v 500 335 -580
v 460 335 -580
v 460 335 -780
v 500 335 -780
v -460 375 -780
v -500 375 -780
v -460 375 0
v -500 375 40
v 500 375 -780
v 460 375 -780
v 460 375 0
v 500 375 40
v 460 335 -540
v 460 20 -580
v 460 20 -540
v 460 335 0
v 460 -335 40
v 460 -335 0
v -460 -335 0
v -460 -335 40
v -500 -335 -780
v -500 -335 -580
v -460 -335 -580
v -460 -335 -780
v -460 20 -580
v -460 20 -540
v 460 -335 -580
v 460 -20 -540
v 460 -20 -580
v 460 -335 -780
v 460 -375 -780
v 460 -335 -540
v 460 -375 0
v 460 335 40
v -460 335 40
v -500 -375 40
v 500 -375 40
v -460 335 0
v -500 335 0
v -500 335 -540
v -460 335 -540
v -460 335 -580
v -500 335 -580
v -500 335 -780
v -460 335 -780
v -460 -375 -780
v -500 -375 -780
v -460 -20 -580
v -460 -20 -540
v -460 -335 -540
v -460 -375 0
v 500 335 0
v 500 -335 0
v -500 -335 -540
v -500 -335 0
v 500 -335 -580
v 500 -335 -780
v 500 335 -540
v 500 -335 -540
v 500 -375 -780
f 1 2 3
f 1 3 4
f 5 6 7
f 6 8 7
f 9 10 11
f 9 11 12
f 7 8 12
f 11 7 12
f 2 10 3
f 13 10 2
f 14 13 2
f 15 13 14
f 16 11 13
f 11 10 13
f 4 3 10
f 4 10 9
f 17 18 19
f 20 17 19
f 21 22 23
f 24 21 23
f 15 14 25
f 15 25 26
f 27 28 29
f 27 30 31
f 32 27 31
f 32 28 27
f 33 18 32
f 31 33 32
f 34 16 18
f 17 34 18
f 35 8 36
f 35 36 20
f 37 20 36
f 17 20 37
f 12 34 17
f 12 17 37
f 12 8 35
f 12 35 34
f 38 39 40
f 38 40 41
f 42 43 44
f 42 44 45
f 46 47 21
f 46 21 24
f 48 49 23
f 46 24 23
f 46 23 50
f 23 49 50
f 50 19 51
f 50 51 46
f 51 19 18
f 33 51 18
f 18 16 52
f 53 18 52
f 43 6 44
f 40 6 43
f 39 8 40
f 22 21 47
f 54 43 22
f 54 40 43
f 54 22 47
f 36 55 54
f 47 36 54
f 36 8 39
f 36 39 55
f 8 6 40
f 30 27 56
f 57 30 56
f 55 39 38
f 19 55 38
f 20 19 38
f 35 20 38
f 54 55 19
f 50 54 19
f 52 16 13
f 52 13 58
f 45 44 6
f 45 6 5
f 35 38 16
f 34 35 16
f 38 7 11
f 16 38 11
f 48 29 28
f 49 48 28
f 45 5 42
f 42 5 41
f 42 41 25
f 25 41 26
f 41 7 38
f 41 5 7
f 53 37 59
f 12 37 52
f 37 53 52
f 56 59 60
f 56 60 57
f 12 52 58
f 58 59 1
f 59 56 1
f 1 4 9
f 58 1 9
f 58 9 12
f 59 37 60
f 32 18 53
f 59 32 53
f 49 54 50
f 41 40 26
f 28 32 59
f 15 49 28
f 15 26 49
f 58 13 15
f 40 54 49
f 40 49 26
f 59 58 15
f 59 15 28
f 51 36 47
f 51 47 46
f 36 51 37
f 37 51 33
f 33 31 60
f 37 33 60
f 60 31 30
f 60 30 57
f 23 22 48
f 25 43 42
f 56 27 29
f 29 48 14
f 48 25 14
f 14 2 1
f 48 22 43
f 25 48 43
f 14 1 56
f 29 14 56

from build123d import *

# Parameters (mm, degrees)
F0_W     = 1000
F0_H     = 750
F1_DEPTH = 40
F2_W     = 40
F2_H     = 40
F3_DEPTH = 780
F4_W     = 40
F4_H     = 40
F5_DEPTH = 670
F6_W     = 40
F6_H     = 40
F7_DEPTH = 670
F8_W     = 40
F8_H     = 40
F9_DEPTH = 920


with BuildPart() as f1:
    # F0 (on Top) → F1 (new body)
    with BuildSketch(Plane.XY):
        Rectangle(F0_W, F0_H)
        Polygon((0, 335), (460, 335), (460, -335), (0, -335), (-460, -335), (-460, 335), align=None, mode=Mode.SUBTRACT)
    extrude(amount=F1_DEPTH)

    # F2 (on face) → F3 (join)
    with BuildSketch(Plane(origin=(0, 0, 0), x_dir=(1, 0, 0), z_dir=(0, 0, -1))):
        with Locations((-480, -355)):
            Rectangle(F2_W, F2_H)
        with Locations((-480, 355)):
            Rectangle(F2_W, F2_H)
        with Locations((480, 355)):
            Rectangle(F2_W, F2_H)
        with Locations((480, -355)):
            Rectangle(F2_W, F2_H)
    extrude(amount=F3_DEPTH)

    # F4 (on face) → F5 (join)
    with BuildSketch(Plane.XZ.offset(-335)):
        with Locations((-480, -560)):
            Rectangle(F4_W, F4_H)
    extrude(amount=F5_DEPTH)

    # F6 (on face) → F7 (join)
    with BuildSketch(Plane.XZ.offset(-335)):
        with Locations((480, -560)):
            Rectangle(F6_W, F6_H)
    extrude(amount=F7_DEPTH)

    # F8 (on face) → F9 (join)
    with BuildSketch(Plane(origin=(460, 0, 0), x_dir=(0, -1, 0), z_dir=(-1, 0, 0))):
        with Locations((0, -560)):
            Rectangle(F8_W, F8_H)
    extrude(amount=F9_DEPTH)


solid = f1.part
